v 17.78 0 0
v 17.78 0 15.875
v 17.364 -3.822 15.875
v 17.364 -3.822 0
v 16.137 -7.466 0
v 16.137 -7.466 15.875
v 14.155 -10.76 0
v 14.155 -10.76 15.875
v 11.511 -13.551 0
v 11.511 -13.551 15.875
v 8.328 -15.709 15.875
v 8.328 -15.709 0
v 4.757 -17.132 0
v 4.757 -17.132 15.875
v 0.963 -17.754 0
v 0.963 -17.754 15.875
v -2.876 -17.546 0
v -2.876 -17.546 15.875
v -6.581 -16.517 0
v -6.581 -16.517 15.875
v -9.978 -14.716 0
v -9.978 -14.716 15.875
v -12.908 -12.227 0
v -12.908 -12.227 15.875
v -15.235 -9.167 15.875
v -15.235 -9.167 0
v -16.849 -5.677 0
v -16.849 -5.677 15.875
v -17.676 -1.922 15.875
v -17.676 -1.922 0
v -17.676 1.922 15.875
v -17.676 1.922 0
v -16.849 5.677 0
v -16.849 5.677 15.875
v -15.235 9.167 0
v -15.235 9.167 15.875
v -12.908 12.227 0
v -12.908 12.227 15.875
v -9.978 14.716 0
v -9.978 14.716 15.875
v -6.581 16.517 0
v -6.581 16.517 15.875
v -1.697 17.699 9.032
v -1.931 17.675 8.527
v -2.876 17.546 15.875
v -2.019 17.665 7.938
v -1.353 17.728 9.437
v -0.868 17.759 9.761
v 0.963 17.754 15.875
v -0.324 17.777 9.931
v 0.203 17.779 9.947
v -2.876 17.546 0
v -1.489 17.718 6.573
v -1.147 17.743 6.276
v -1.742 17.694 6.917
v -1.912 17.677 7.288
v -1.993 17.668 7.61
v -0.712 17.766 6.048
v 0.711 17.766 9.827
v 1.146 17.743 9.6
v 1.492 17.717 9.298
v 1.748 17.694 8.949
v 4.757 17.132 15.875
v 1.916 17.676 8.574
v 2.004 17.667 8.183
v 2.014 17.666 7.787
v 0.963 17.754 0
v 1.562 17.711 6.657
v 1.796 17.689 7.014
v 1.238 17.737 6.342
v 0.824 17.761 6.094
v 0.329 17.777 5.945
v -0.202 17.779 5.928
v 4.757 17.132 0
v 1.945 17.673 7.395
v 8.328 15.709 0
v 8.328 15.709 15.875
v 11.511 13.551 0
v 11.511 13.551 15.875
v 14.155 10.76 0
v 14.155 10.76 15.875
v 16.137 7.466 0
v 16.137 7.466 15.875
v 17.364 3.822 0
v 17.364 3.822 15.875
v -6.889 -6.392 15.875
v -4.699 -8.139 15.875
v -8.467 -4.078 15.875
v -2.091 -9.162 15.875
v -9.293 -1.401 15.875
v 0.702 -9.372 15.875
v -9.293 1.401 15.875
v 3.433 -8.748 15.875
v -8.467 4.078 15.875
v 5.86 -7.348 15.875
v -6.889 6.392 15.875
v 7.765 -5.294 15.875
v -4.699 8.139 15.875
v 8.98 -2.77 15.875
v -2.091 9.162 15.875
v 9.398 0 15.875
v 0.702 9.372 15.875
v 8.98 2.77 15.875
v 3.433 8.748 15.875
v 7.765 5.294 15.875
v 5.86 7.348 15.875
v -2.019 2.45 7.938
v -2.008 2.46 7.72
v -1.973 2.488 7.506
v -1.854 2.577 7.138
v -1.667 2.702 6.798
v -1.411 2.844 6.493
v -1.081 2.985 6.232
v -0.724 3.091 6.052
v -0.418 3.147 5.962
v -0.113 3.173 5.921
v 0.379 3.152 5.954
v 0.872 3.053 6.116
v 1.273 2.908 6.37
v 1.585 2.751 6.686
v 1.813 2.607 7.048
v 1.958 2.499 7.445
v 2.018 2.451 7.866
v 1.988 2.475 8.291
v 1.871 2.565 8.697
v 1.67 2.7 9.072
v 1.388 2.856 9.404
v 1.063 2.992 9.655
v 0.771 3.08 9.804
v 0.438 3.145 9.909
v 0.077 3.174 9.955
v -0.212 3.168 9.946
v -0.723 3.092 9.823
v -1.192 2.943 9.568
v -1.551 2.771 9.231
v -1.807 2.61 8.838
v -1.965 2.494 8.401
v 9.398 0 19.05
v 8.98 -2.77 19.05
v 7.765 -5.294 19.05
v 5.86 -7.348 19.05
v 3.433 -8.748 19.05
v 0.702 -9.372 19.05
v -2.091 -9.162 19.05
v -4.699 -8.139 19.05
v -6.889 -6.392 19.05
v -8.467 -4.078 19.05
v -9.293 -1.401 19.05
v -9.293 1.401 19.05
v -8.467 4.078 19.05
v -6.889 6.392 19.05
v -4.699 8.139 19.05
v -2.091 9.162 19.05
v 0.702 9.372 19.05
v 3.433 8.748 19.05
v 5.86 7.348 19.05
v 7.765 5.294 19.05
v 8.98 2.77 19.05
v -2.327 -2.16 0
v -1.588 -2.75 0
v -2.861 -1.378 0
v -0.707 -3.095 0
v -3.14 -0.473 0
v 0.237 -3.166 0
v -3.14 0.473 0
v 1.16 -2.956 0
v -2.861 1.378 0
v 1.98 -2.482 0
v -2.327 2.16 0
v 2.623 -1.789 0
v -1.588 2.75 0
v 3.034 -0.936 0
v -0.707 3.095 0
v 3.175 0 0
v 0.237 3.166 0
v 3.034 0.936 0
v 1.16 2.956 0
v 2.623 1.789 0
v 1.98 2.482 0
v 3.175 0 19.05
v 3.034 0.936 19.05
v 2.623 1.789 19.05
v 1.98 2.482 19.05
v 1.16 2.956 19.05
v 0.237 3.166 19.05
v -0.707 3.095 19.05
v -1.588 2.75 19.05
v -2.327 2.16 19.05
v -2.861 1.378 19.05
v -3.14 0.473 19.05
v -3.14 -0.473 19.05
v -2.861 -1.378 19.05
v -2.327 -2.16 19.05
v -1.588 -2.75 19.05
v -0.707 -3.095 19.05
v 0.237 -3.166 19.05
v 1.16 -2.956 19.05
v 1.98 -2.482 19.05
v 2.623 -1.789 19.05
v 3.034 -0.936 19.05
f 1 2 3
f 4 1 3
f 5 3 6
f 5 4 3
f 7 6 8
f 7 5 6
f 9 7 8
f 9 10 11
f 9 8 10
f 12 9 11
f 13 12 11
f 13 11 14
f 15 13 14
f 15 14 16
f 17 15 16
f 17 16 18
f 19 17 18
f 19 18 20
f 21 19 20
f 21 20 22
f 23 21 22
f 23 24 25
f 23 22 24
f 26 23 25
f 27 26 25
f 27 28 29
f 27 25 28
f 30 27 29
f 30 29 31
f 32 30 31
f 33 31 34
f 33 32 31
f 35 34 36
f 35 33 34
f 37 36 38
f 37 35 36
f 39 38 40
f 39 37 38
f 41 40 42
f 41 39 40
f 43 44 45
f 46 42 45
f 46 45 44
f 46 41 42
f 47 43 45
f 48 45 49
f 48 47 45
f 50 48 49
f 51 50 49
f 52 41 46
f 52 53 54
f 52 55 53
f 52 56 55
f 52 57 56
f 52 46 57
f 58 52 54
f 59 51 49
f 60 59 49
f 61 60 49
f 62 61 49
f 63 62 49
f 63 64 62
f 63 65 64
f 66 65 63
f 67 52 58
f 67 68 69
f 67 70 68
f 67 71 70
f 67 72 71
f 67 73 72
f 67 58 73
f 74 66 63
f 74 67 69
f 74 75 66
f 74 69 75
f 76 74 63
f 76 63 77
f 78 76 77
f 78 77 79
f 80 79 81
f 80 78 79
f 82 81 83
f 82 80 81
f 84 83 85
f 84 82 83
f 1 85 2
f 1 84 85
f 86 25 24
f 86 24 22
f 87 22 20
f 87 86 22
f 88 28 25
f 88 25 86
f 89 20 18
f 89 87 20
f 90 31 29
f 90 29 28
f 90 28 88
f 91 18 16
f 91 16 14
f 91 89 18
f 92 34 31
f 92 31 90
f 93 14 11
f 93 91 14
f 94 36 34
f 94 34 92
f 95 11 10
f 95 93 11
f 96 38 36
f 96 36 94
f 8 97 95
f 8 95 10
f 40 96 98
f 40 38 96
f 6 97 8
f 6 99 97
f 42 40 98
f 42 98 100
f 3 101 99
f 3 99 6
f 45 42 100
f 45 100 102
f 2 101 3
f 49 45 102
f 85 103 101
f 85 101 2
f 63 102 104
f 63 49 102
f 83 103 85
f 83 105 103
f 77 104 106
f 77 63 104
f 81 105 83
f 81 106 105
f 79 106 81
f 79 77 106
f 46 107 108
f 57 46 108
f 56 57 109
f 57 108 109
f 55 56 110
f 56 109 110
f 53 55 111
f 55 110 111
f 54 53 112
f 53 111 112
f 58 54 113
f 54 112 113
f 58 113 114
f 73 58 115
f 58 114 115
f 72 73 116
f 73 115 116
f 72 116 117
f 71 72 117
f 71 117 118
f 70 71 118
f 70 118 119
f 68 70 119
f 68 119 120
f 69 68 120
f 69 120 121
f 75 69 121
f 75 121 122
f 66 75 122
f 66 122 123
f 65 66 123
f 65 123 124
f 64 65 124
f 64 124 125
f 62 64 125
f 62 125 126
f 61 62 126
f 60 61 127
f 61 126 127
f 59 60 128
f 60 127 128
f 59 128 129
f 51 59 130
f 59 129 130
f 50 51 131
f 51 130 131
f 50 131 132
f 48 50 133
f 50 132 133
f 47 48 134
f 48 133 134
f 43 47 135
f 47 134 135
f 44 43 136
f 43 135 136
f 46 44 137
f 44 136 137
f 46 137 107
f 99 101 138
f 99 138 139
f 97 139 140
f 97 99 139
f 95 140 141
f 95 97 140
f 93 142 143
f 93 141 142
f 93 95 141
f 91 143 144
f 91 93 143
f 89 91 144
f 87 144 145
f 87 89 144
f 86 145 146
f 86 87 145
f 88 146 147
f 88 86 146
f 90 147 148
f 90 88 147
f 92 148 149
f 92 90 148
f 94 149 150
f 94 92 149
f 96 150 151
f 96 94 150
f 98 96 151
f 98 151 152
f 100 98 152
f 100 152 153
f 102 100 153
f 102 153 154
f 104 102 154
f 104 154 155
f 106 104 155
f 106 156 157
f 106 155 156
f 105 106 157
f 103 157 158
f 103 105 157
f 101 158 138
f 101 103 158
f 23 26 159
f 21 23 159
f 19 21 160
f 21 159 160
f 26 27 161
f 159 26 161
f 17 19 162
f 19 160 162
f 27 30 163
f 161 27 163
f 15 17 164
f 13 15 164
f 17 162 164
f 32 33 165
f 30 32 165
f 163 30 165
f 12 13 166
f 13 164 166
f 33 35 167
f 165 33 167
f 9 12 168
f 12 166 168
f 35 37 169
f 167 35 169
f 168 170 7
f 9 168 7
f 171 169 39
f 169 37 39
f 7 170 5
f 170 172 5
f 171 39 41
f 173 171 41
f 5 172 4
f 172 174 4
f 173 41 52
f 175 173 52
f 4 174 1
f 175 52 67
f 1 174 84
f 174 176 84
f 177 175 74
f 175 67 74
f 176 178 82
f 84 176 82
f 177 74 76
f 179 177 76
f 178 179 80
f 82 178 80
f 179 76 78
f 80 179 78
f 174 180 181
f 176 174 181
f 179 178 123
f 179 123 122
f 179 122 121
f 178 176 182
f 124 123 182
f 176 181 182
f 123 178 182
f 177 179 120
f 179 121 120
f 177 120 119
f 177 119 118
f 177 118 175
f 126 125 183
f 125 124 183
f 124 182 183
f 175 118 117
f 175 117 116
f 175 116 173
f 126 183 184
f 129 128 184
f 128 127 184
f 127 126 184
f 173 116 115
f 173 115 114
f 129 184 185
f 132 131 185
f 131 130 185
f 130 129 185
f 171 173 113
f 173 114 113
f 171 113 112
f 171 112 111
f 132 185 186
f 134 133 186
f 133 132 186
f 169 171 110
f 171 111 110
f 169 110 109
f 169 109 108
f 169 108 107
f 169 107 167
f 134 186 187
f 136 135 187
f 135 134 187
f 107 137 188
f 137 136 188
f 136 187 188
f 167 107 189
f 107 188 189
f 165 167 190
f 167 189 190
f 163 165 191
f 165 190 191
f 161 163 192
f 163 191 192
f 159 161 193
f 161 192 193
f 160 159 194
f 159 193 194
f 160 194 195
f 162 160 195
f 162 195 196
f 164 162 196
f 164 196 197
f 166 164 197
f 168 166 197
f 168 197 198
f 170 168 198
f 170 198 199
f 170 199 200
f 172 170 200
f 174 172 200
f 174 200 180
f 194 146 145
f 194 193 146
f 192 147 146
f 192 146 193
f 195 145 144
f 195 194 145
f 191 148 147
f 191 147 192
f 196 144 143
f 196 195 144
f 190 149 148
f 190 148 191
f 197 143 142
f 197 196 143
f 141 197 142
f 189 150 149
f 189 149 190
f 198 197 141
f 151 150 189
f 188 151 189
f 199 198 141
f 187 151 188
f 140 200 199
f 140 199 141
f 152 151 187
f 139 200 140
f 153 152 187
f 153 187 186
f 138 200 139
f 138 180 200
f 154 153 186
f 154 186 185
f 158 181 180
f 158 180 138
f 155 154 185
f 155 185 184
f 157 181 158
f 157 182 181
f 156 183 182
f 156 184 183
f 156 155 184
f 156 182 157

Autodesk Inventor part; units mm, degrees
ref_plane "YZ Plane" through (0, 0, 0) normal (1, 0, 0) x (0, 1, 0)
ref_plane "XZ Plane" through (0, 0, 0) normal (0, 1, 0) x (-1, 0, 0)
ref_plane "XY Plane" through (0, 0, 0) normal (0, 0, 1) x (1, 0, 0)
sketch "Sketch1" plane through (0, 0, 0) normal (0, 0, 1) x (1, 0, 0)
  circle A0 centre (0, 0) radius 17.78
  dimension "d0" = 35.56
extrude "Extrusion1" add sketch "Sketch1" along normal blind 15.875
sketch "Sketch2" plane through (0, 0, 15.875) normal (0, 0, 1) x (1, 0, 0)
  circle A0 centre (0, 0) radius 9.398
  dimension "d4" = 18.796
extrude "Extrusion2" add sketch "Sketch2" along normal blind 3.175
sketch "Sketch3" plane through (0, 0, 19.05) normal (0, 0, 1) x (1, 0, 0)
  circle A0 centre (0, 0) radius 3.175
  dimension "d7" = 6.35
extrude "Extrusion3" cut sketch "Sketch3" against normal blind 25.4
sketch "Sketch4" plane through (0, 0, 0) normal (0, 1, 0) x (-1, 0, 0)
  circle A0 centre (0, 7.9375) radius 2.0193
  line L0 (-17.78, 0) -> (17.78, 0) projected
  point P0 (0, 0)
  dimension "d10" = 4.0386
  dimension "d13" = 7.9375
extrude "Extrusion4" cut sketch "Sketch4" along normal blind 25.4
properties part number "Flywheel"
